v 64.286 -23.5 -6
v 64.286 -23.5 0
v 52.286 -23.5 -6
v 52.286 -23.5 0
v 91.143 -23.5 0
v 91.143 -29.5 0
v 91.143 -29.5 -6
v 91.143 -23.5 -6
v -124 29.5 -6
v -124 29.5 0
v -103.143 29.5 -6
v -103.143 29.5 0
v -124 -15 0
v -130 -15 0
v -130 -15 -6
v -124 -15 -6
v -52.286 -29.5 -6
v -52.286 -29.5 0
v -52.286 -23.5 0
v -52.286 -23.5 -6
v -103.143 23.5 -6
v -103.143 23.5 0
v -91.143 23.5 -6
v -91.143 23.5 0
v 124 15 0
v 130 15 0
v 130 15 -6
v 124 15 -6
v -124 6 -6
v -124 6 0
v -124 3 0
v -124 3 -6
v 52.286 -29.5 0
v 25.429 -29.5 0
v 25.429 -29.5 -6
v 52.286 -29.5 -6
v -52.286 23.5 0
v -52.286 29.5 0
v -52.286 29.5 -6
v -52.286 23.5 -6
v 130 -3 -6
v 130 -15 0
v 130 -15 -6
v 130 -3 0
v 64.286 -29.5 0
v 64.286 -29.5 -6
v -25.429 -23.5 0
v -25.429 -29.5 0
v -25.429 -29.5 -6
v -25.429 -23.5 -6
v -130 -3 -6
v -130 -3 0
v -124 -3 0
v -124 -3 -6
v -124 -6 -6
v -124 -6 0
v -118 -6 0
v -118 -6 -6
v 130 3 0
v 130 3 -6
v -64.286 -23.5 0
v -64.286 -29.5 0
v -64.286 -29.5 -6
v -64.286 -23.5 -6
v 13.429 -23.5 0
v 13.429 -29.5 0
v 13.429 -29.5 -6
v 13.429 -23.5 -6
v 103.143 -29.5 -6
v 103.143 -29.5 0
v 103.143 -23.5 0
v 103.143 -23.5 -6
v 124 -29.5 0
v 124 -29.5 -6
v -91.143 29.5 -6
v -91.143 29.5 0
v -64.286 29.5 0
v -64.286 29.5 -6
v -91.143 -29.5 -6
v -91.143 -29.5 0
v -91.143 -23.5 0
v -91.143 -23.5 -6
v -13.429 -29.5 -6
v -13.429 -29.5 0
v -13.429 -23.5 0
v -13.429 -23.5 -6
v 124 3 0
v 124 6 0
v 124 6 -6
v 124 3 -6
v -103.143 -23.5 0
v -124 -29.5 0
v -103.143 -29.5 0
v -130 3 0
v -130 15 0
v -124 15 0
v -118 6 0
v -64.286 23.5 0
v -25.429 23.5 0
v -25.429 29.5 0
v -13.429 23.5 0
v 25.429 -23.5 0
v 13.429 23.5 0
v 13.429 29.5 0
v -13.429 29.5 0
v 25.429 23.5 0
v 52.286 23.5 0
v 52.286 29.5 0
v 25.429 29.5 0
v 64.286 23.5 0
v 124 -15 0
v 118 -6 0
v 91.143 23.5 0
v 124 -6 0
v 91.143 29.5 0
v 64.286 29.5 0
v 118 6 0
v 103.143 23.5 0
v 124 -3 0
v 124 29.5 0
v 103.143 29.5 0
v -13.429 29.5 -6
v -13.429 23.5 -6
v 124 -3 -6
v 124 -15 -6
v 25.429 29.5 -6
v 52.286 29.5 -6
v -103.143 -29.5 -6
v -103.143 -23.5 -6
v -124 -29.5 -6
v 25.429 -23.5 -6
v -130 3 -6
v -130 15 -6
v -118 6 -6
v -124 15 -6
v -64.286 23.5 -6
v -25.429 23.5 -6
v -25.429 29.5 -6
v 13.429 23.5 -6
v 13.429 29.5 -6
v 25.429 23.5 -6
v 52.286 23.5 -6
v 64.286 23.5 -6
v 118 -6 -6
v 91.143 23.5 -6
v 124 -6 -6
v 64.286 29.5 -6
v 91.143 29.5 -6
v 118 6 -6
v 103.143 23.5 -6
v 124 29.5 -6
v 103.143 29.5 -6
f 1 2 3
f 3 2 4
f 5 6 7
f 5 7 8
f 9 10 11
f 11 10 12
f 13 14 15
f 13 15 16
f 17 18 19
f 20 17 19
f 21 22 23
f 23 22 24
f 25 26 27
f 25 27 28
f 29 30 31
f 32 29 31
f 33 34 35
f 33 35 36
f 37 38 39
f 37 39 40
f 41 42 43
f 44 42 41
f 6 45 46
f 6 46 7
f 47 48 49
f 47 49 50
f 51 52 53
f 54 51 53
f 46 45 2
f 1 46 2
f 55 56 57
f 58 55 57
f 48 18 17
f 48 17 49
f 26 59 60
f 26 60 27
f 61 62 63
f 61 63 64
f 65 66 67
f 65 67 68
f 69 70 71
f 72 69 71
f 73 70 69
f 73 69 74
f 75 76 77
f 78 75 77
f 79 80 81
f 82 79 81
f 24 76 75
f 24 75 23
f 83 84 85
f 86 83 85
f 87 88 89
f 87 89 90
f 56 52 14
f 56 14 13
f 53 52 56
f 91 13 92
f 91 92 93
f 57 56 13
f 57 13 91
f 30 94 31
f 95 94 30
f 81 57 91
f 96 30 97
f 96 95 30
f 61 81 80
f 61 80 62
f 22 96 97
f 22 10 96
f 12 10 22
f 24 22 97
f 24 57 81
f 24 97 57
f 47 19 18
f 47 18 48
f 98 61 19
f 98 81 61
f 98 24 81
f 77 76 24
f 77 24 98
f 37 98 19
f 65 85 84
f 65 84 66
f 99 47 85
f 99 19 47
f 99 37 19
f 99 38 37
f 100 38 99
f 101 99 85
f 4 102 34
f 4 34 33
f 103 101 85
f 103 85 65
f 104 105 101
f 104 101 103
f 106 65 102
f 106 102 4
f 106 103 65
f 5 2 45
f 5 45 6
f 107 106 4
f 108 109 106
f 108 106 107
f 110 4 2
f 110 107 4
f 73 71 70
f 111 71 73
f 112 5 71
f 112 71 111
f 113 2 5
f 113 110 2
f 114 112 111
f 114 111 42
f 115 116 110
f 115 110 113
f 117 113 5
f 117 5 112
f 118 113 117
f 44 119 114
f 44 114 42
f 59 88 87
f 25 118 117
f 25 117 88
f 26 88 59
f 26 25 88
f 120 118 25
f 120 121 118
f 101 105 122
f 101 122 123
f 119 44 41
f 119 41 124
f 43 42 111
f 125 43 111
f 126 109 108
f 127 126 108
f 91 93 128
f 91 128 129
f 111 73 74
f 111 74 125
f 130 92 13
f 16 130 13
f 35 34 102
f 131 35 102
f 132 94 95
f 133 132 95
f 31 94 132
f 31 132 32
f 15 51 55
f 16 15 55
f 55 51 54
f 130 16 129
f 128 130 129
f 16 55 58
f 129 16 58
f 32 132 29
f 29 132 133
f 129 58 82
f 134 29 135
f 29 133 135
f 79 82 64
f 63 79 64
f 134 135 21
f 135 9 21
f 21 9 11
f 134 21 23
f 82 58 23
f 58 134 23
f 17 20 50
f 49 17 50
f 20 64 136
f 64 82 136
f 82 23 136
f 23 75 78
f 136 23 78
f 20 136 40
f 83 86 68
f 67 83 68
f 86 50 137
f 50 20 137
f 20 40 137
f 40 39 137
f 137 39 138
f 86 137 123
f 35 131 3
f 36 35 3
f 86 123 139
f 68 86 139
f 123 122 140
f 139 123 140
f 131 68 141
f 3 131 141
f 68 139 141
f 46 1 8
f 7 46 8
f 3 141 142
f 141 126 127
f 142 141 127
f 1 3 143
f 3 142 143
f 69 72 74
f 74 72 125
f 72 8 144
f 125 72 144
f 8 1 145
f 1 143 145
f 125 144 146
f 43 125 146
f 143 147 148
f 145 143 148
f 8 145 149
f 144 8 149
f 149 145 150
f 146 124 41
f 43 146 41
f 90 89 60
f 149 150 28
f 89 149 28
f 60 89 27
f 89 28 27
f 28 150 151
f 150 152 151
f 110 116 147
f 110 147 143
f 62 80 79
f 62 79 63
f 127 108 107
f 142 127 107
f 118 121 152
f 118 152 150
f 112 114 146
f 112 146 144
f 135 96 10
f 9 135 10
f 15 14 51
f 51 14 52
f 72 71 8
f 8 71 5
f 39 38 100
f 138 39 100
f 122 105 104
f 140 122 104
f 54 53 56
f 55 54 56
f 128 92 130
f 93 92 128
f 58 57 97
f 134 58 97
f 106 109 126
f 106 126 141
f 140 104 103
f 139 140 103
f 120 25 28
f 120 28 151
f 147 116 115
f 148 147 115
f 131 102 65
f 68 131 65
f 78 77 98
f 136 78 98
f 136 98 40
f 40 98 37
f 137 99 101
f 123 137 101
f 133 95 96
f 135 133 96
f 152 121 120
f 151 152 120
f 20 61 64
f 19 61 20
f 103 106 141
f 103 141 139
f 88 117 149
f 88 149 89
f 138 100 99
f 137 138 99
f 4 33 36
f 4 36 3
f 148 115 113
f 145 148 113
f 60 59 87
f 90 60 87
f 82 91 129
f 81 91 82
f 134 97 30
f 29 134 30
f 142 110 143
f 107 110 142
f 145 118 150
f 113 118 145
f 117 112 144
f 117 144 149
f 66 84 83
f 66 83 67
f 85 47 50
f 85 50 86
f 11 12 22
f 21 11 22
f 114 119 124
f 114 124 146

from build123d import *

# Parameters (mm, degrees)
SKETCH1_W                                  = 260
SKETCH1_H                                  = 59
BOSS_EXTRUDE1_DEPTH                        = 6
SKETCH3_W                                  = 6
SKETCH3_H                                  = 6
SKETCH3_H_2                                = 14.5
CUT_EXTRUDE1_DEPTH                         = 7
SKETCH3_3_W                                = 12
SKETCH3_3_H                                = 6
CUT_EXTRUDE2_DEPTH                         = 7
MIRROR1_AT_THE_SECOND_PLANE_COPY_1_SKETC_W = 12
MIRROR1_AT_THE_SECOND_PLANE_COPY_1_SKETC_H = 6
MIRROR1_AT_THE_SECOND_PLANE_COPY_1_DEPTH   = 7


with BuildPart() as part:
    # Sketch1 → Boss-Extrude1 (new body)
    with BuildSketch(Plane.XY):
        Rectangle(SKETCH1_W, SKETCH1_H)
    extrude(amount=-BOSS_EXTRUDE1_DEPTH)

    # Sketch3 → Cut-Extrude1 (cut, through all)
    with BuildSketch(Plane.XY):
        Polygon((-124, 6), (-124, 3), (-124, -3), (-124, -6), (-118, -6), (-118, 6), align=None)
        with Locations((-127, 0)):
            Rectangle(SKETCH3_W, SKETCH3_H)
        with Locations((-127, 22.25)):
            Rectangle(SKETCH3_W, SKETCH3_H_2)
        with Locations((-127, -22.25)):
            Rectangle(SKETCH3_W, SKETCH3_H_2)
    cut_extrude1 = extrude(amount=-CUT_EXTRUDE1_DEPTH, mode=Mode.SUBTRACT)

    # Sketch3<3> → Cut-Extrude2 (cut, through all)
    with BuildSketch(Plane.XY):
        with Locations((-97.142857143, -26.5)):
            Rectangle(SKETCH3_3_W, SKETCH3_3_H)
        with Locations((-58.285714286, -26.5)):
            Rectangle(SKETCH3_3_W, SKETCH3_3_H)
        with Locations((-19.428571429, -26.5)):
            Rectangle(SKETCH3_3_W, SKETCH3_3_H)
    cut_extrude2 = extrude(amount=-CUT_EXTRUDE2_DEPTH, mode=Mode.SUBTRACT)

    # Mirror1: Cut-Extrude2 across plane
    add(cut_extrude2.mirror(Plane(origin=(0, 0, 0), x_dir=(0, 0, 1), z_dir=(1, 0, 0))), mode=Mode.SUBTRACT)

    # Mirror1 at the second plane: Cut-Extrude2 across plane
    add(cut_extrude2.mirror(Plane.ZX), mode=Mode.SUBTRACT)

    # Mirror1 at the second plane copy 1 sketc → Mirror1 at the second plane copy 1 (cut, through all)
    with BuildSketch(Plane(origin=(0, 0, 0), x_dir=(-1, 0, 0), z_dir=(0, 0, 1))):
        with Locations((-97.142857143, -26.5)):
            Rectangle(MIRROR1_AT_THE_SECOND_PLANE_COPY_1_SKETC_W, MIRROR1_AT_THE_SECOND_PLANE_COPY_1_SKETC_H)
        with Locations((-58.285714286, -26.5)):
            Rectangle(MIRROR1_AT_THE_SECOND_PLANE_COPY_1_SKETC_W, MIRROR1_AT_THE_SECOND_PLANE_COPY_1_SKETC_H)
        with Locations((-19.428571429, -26.5)):
            Rectangle(MIRROR1_AT_THE_SECOND_PLANE_COPY_1_SKETC_W, MIRROR1_AT_THE_SECOND_PLANE_COPY_1_SKETC_H)
    extrude(amount=-MIRROR1_AT_THE_SECOND_PLANE_COPY_1_DEPTH, mode=Mode.SUBTRACT)

    # Mirror2: Cut-Extrude1 across plane
    add(cut_extrude1.mirror(Plane(origin=(0, 0, 0), x_dir=(0, 0, 1), z_dir=(1, 0, 0))), mode=Mode.SUBTRACT)


solid = part.part
